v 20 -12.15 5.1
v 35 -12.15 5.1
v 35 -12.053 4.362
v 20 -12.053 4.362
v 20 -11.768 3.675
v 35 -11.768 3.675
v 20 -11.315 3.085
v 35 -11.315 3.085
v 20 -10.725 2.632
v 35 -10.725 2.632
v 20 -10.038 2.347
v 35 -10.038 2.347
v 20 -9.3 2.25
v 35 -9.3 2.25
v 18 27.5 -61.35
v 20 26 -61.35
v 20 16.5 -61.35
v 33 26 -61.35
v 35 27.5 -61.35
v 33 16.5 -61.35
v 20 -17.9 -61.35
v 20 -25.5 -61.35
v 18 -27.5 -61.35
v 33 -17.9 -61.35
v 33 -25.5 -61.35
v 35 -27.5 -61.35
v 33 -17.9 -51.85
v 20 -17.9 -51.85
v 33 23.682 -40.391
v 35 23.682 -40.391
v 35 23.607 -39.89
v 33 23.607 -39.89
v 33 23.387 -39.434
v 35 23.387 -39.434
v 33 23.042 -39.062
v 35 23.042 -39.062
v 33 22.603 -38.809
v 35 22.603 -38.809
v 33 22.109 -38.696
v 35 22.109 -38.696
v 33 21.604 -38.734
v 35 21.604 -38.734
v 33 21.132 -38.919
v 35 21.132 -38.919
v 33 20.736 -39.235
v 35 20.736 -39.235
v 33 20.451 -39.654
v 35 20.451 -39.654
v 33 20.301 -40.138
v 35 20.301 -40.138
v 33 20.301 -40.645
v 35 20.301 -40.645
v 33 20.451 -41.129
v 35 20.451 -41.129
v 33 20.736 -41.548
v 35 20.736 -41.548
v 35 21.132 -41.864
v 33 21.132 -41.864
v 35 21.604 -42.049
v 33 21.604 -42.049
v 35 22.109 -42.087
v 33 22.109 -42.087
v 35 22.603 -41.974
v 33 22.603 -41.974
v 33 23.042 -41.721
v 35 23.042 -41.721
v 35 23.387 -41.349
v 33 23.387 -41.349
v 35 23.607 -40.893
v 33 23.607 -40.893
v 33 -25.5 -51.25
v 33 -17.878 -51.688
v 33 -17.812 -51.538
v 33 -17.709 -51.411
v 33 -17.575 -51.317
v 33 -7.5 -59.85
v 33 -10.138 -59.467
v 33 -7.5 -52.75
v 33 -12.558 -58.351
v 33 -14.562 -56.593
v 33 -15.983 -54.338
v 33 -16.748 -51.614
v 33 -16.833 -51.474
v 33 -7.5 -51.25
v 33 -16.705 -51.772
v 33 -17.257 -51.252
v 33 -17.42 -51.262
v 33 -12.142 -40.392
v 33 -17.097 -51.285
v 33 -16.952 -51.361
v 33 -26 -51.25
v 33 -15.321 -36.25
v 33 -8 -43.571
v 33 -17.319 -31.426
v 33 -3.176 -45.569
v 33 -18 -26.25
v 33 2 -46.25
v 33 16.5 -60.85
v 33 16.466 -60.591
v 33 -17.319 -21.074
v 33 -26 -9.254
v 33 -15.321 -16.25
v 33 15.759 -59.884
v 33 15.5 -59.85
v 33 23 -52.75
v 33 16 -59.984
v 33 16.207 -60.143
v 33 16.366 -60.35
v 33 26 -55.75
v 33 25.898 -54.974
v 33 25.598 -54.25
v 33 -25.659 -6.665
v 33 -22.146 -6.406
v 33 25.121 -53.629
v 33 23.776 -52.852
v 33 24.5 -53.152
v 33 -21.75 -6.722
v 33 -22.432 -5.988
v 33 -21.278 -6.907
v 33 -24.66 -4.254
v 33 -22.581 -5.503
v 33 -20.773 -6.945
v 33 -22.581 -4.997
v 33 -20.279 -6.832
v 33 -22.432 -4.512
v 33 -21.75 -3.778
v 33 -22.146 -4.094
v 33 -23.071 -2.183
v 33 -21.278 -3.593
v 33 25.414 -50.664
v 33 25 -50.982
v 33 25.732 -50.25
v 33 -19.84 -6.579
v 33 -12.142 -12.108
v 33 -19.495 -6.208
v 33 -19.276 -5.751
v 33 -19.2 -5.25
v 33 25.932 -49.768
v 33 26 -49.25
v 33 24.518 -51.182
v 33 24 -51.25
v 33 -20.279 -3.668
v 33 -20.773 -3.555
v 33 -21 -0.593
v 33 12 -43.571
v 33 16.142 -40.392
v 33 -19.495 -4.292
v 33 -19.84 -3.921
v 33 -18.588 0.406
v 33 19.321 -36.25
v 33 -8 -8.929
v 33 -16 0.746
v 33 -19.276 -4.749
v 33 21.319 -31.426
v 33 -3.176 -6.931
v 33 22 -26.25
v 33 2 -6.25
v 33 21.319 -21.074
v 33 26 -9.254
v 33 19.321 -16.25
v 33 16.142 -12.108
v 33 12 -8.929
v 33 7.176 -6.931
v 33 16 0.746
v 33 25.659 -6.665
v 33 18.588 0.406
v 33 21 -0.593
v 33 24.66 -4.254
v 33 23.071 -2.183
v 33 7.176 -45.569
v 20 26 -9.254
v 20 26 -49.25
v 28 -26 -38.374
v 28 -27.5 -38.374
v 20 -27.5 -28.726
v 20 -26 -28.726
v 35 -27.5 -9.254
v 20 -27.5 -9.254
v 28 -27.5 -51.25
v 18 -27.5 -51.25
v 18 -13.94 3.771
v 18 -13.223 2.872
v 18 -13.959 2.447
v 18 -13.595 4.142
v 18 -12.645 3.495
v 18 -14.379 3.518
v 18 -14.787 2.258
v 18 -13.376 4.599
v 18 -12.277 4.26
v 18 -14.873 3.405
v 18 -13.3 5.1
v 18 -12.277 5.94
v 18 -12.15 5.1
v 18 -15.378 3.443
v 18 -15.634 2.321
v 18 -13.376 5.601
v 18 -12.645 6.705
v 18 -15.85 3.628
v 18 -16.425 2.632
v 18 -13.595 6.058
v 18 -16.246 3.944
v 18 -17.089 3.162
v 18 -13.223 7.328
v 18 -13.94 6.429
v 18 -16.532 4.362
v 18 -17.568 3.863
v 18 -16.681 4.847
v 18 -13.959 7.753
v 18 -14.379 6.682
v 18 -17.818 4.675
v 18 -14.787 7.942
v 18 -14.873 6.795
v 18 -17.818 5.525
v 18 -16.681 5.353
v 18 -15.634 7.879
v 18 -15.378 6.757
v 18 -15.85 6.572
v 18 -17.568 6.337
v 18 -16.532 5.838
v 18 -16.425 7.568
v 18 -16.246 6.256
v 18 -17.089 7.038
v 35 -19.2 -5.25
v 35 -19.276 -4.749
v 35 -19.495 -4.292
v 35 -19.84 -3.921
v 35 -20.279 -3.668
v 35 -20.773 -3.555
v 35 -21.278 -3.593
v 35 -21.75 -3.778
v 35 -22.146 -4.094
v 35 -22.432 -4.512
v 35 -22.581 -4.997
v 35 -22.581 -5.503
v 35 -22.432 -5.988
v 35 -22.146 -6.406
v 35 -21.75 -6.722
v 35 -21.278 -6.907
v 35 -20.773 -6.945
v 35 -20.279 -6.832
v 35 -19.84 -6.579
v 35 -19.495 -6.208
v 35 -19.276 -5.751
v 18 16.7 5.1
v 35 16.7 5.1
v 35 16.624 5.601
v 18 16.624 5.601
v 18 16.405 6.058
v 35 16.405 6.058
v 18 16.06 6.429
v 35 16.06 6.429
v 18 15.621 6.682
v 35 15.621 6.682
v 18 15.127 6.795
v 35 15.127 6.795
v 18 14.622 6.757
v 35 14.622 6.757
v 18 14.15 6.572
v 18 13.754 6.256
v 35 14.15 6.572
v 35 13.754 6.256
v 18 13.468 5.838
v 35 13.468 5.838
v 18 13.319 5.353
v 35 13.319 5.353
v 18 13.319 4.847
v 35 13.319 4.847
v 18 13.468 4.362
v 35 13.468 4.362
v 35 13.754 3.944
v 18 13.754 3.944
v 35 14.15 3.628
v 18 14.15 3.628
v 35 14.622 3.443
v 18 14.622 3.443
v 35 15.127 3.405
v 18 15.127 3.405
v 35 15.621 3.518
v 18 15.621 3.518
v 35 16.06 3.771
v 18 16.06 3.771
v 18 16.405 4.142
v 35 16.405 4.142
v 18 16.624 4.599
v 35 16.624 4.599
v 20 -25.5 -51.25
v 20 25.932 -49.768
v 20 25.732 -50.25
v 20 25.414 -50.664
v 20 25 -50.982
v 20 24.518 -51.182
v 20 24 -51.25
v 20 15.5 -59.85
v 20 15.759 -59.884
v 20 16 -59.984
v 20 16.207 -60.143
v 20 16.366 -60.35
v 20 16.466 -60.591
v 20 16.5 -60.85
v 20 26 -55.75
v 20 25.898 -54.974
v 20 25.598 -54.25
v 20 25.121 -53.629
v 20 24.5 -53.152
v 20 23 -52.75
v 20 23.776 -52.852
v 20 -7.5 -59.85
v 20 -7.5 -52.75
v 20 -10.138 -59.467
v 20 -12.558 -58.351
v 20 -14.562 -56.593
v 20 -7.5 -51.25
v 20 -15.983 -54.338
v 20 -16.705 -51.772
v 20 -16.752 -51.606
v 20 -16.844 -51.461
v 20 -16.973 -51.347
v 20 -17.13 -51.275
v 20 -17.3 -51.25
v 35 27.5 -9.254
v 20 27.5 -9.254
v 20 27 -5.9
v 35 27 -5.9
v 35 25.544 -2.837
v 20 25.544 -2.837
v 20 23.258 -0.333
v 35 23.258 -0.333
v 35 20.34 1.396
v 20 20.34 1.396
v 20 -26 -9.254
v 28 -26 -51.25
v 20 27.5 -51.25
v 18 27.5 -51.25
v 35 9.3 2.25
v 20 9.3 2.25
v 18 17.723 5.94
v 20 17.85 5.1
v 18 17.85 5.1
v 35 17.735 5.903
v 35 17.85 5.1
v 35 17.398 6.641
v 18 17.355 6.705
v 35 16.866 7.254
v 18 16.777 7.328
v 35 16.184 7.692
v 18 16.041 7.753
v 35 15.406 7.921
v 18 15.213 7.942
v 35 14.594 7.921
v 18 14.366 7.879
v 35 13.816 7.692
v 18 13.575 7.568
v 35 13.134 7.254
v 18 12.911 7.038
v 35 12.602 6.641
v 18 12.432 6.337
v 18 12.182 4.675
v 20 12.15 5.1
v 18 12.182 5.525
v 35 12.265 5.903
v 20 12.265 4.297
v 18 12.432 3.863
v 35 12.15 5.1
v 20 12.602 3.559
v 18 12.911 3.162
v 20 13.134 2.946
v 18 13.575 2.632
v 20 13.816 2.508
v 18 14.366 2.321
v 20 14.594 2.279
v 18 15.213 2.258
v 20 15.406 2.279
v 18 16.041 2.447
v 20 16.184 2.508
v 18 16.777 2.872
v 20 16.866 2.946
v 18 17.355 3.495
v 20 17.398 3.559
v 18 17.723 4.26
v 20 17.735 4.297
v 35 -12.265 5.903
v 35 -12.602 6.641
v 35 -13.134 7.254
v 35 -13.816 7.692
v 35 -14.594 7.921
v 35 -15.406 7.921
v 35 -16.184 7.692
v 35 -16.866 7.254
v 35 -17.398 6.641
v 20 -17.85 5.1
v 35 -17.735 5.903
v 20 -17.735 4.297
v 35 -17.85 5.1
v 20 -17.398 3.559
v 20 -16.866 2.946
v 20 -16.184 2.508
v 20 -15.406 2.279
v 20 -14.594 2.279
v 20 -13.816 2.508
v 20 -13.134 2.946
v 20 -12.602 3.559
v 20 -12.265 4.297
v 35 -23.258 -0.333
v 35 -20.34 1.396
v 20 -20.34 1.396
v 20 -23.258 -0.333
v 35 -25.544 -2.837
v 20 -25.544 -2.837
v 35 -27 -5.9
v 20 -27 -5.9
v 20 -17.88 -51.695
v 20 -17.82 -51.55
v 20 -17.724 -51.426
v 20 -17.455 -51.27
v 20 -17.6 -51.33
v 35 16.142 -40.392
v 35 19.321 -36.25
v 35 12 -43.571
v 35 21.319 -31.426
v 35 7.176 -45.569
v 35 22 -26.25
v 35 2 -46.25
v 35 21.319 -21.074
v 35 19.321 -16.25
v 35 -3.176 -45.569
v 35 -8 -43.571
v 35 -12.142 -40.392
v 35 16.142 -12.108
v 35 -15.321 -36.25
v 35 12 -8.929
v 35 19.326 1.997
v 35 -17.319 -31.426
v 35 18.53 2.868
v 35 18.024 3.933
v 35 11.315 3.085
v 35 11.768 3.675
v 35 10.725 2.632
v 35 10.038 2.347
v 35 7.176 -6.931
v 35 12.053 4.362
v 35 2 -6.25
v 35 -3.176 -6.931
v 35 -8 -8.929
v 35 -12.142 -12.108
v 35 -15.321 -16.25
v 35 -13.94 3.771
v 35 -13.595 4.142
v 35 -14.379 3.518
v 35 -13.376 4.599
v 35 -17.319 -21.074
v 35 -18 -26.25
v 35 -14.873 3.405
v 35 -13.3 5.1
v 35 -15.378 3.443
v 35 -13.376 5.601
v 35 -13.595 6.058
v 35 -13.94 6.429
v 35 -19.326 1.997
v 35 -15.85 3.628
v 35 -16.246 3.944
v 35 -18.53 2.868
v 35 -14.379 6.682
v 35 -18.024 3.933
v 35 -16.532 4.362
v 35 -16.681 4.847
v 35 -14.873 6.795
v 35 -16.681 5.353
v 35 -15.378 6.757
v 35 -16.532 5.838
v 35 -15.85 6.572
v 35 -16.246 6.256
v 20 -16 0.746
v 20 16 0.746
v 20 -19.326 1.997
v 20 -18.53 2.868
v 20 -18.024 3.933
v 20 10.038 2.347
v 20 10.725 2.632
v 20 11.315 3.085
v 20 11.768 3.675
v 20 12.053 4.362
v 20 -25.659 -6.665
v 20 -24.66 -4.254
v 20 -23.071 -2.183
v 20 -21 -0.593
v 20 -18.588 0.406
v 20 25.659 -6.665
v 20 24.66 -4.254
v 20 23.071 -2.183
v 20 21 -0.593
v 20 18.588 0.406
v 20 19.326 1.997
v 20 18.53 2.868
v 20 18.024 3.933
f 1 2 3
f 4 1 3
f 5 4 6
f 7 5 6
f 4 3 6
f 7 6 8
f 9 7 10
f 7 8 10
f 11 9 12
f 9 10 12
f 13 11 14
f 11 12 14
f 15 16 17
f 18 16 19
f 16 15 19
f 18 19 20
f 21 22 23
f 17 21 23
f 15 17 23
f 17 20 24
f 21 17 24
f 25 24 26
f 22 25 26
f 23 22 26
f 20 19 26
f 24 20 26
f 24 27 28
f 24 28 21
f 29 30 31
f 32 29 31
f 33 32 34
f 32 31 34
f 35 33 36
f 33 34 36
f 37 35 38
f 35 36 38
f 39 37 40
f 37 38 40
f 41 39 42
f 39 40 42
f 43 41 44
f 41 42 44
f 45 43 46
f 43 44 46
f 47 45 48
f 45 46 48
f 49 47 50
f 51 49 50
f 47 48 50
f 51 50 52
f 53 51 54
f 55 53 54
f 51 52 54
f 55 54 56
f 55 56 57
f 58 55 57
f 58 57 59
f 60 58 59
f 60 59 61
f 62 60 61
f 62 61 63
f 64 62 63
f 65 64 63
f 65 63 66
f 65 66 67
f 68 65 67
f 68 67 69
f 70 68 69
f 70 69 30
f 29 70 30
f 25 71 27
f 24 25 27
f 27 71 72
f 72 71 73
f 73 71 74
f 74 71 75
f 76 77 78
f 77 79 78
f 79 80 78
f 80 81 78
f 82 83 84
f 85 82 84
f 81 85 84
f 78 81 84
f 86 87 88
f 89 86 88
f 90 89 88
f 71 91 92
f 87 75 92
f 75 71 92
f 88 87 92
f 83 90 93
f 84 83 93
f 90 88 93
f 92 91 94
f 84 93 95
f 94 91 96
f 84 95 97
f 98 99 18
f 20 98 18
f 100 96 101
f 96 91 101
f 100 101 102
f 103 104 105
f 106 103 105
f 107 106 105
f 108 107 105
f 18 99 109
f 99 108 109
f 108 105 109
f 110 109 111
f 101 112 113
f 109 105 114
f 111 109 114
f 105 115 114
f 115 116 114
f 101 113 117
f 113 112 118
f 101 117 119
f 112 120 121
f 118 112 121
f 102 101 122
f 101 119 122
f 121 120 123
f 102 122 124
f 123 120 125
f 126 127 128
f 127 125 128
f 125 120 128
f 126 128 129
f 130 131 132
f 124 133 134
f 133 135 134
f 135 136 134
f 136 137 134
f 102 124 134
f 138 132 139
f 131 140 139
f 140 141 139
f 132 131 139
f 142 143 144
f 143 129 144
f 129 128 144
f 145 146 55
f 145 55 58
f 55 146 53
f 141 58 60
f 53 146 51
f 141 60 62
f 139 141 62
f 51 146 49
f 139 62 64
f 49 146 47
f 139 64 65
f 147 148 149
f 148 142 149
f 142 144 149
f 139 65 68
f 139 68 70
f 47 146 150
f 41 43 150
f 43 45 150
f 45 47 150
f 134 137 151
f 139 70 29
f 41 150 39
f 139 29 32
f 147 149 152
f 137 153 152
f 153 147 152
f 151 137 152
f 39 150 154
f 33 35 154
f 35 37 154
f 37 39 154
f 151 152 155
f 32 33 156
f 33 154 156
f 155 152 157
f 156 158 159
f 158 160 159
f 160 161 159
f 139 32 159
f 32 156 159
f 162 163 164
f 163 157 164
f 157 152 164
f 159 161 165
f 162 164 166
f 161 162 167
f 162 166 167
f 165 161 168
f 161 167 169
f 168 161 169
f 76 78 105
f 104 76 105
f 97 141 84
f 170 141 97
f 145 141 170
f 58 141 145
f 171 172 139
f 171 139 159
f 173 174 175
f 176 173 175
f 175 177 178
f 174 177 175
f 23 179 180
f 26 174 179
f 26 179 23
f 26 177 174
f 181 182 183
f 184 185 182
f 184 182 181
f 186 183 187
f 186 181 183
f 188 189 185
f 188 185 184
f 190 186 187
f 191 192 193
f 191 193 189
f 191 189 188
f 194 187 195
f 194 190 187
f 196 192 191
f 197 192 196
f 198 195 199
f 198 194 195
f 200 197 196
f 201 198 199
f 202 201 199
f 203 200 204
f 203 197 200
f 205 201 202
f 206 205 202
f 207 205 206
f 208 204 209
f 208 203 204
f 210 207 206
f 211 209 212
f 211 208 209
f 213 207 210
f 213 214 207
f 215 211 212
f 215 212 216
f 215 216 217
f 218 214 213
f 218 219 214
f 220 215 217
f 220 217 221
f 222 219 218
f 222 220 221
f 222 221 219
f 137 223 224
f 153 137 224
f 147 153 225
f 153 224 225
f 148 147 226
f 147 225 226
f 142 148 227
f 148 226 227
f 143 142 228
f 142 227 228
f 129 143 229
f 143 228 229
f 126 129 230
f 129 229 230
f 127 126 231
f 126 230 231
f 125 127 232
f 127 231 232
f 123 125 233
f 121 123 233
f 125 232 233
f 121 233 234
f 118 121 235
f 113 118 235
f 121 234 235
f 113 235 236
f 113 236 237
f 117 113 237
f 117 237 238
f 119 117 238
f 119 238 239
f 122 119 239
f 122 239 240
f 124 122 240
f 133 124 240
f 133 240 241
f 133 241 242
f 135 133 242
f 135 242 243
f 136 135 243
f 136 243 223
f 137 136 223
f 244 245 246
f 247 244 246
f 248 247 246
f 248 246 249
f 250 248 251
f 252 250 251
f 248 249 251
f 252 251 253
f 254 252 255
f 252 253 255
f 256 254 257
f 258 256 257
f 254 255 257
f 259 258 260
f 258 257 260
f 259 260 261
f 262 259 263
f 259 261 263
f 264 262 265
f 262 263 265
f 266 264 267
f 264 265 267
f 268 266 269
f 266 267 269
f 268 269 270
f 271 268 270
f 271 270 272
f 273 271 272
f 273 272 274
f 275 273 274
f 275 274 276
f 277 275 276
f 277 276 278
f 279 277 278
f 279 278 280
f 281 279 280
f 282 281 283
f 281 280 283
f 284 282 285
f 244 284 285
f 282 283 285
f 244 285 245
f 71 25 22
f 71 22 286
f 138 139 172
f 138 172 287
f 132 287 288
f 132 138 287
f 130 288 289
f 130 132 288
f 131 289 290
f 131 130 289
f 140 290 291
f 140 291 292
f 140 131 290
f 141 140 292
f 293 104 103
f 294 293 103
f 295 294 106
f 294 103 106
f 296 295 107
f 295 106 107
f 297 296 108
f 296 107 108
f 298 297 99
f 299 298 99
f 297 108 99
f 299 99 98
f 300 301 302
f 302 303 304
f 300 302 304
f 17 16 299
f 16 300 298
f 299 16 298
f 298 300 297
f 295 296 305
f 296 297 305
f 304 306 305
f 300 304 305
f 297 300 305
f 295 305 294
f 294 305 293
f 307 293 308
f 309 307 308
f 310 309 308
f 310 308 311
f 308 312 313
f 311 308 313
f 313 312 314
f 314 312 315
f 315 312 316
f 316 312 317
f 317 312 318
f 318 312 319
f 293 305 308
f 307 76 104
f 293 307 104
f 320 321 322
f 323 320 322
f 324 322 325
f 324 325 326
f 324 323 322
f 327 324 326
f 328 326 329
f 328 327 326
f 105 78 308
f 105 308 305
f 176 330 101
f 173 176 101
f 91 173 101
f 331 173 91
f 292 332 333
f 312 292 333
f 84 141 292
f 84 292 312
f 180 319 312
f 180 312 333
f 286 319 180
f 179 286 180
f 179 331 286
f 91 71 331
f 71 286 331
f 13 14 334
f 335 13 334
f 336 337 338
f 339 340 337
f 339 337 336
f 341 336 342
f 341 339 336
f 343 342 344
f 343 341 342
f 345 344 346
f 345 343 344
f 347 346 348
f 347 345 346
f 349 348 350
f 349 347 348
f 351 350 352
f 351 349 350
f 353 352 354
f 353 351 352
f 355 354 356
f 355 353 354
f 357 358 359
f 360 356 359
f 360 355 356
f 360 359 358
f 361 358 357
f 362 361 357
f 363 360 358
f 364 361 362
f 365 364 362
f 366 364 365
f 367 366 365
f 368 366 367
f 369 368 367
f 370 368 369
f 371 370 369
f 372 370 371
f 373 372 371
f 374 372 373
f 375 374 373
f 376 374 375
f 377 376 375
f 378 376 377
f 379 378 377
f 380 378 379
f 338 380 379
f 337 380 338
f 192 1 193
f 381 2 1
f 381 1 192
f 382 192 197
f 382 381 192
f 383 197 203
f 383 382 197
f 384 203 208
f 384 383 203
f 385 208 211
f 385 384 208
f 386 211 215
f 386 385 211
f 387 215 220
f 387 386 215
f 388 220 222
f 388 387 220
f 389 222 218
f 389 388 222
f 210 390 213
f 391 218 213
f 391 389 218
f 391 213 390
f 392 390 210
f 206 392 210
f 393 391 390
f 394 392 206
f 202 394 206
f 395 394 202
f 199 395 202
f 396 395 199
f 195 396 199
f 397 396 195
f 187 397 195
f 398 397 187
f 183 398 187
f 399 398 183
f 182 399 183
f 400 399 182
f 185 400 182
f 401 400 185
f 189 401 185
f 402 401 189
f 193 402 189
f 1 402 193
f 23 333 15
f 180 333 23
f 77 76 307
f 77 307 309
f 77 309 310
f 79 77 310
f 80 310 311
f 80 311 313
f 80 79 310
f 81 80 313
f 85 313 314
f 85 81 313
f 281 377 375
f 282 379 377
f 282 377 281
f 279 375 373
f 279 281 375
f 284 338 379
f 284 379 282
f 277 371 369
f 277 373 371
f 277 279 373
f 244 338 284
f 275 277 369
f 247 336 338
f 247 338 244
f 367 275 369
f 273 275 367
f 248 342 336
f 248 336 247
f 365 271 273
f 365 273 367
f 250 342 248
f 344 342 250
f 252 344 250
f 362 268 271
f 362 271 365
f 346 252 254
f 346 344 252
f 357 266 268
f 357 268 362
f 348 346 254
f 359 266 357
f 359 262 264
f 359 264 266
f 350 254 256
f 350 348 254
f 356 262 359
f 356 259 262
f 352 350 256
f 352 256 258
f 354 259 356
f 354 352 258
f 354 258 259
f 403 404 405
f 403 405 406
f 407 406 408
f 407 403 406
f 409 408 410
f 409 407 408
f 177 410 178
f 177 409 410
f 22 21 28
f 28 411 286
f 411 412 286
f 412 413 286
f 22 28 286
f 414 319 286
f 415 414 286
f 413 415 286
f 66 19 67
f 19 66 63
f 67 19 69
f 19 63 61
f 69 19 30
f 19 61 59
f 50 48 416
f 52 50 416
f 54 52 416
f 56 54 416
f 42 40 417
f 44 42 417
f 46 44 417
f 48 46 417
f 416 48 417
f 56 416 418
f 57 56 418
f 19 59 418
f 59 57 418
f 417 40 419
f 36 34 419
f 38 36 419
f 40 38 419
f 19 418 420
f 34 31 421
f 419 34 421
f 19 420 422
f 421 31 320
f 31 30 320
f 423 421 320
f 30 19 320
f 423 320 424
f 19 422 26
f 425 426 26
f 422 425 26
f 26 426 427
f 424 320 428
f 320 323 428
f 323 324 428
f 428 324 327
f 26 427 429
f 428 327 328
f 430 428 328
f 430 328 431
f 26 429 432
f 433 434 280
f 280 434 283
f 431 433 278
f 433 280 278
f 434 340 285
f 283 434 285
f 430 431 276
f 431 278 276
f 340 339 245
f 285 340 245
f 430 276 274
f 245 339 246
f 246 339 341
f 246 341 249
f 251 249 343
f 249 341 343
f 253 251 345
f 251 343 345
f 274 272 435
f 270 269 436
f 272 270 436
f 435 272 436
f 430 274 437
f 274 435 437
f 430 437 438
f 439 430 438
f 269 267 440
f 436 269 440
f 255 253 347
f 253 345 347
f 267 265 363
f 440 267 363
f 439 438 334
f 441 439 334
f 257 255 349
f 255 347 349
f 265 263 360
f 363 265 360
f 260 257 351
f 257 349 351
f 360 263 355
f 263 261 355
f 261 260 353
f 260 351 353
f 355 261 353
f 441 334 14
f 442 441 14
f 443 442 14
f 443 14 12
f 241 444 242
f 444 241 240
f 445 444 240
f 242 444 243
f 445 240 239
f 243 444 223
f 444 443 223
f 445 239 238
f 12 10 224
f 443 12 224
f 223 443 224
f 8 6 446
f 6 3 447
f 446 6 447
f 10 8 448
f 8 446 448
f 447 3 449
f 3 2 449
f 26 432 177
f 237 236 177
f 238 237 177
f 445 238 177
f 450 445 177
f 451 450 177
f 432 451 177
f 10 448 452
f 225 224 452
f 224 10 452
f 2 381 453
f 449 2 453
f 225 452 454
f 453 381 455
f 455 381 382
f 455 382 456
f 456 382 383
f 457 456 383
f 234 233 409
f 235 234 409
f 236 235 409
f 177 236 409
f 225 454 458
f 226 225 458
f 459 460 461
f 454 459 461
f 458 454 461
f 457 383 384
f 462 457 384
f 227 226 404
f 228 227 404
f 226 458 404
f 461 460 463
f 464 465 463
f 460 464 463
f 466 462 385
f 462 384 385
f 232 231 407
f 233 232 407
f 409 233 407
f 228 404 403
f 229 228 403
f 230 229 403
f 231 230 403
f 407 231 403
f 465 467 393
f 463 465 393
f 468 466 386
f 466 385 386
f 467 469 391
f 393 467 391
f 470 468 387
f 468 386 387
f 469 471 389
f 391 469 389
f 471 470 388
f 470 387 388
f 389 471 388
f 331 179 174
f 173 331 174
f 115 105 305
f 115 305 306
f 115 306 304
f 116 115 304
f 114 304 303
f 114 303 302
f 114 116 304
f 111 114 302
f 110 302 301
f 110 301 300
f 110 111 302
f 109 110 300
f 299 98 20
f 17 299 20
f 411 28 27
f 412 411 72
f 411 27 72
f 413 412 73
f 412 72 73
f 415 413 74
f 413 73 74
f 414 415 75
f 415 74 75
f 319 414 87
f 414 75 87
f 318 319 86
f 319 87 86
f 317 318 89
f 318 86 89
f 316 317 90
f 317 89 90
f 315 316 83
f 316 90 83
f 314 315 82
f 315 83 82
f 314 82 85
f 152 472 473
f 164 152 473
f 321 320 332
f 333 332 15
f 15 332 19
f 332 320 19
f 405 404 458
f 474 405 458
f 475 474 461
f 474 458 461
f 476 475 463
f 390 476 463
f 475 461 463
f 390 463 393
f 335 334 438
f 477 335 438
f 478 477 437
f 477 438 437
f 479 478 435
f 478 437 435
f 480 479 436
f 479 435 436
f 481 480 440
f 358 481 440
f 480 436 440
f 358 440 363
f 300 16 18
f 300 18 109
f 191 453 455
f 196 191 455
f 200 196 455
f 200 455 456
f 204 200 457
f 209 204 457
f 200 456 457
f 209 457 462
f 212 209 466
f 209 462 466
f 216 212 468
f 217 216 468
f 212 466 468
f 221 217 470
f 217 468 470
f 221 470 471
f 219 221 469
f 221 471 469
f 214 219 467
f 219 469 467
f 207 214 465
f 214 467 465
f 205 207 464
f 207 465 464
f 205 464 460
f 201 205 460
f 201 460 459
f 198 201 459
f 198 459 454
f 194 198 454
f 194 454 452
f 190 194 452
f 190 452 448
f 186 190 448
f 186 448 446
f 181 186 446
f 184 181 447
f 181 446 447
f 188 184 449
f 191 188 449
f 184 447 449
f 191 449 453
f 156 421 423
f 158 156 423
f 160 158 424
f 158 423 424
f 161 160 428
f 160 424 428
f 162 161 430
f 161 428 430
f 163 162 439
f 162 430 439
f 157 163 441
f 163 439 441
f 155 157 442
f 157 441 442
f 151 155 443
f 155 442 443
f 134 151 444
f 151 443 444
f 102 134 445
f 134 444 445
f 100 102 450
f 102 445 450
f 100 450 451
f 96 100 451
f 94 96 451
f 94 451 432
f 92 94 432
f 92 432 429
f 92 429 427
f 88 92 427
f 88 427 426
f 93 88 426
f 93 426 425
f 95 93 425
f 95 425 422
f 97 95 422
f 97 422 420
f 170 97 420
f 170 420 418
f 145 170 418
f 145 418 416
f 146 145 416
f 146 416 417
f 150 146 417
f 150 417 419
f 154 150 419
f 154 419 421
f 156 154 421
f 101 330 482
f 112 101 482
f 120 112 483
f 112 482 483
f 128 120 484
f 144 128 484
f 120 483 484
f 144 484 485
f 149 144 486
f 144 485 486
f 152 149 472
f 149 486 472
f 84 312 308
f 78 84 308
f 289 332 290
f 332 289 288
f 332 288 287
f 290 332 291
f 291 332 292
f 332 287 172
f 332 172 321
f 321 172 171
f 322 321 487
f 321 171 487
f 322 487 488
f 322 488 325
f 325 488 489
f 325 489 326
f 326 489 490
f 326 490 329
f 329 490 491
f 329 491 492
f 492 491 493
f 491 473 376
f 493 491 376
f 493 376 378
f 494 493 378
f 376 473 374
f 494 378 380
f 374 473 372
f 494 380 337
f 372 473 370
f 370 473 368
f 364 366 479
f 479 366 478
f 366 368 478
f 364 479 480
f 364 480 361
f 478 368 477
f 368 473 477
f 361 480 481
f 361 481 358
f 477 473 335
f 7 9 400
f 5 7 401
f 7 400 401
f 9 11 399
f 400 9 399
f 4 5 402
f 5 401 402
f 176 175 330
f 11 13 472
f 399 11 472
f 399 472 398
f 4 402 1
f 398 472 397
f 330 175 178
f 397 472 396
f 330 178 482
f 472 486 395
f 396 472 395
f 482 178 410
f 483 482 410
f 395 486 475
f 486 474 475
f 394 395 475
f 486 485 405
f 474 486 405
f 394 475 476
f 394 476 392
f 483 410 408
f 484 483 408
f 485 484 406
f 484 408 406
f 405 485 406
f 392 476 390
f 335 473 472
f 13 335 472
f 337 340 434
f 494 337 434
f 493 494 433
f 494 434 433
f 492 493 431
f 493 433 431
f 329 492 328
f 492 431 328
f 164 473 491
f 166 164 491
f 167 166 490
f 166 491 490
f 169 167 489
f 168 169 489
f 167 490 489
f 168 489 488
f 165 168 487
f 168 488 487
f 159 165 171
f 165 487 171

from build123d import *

# Parameters (mm, degrees)
PAD014_DEPTH    = 17
POCKET010_DEPTH = 15
SKETCH035_R     = 1.7
SKETCH035_R_2   = 20
POCKET011_DEPTH = 17
SKETCH036_W     = 0.5
SKETCH036_H     = 10.1
PAD015_DEPTH    = 13
SKETCH037_W     = 52
SKETCH037_H     = 10.1
PAD016_DEPTH    = 2
SKETCH038_W     = 53.5
SKETCH038_H     = 2
POCKET012_DEPTH = 55
POCKET013_DEPTH = 2
POCKET014_DEPTH = 1.5


with BuildPart() as part:
    # Sketch033 → Pad014 (new body)
    with BuildSketch(Plane.YZ):
        with BuildLine():
            Line((27.5, -61.35), (-27.5, -61.35))
            Line((-27.5, -51.25), (-27.5, -61.35))
            Line((-27.5, -9.2536580703), (-27.5, -51.25))
            ThreePointArc((-20.3403225806, 1.3958301754), (-25.5436814091, -2.837417336), (-27.5, -9.2536580703))
            ThreePointArc((-20.3403225806, 1.3958301754), (-18.5304586403, 2.8682640924), (-17.85, 5.1))
            ThreePointArc((-12.15, 5.1), (-15, 7.95), (-17.85, 5.1))
            ThreePointArc((-12.15, 5.1), (-11.3152543264, 3.0847456736), (-9.3, 2.25))
            Line((-9.3, 2.25), (9.3, 2.25))
            ThreePointArc((9.3, 2.25), (11.3152543264, 3.0847456736), (12.15, 5.1))
            ThreePointArc((17.85, 5.1), (15, 7.95), (12.15, 5.1))
            ThreePointArc((17.85, 5.1), (18.5304586403, 2.8682640924), (20.3403225806, 1.3958301754))
            ThreePointArc((27.5, -9.2536580703), (25.5436814091, -2.837417336), (20.3403225806, 1.3958301754))
            Line((27.5, -9.2536580703), (27.5, -51.25))
            Line((27.5, -51.25), (27.5, -61.35))
        make_face()
    extrude(amount=-PAD014_DEPTH)

    # Sketch034 (on Face16 of Pad014) → Pocket010 (cut)
    with BuildSketch(Plane(origin=(-17, 0, 0), x_dir=(0, -1, 0), z_dir=(-1, 0, 0))):
        with BuildLine():
            Line((26, -9.2536580703), (26, -61.35))
            Line((-26, -61.35), (26, -61.35))
            Line((-26, -61.35), (-26, -9.2536580703))
            ThreePointArc((-16, 0.7463419297), (-23.0710678119, -2.1825902585), (-26, -9.2536580703))
            Line((16, 0.7463419297), (-16, 0.7463419297))
            ThreePointArc((26, -9.2536580703), (23.0710678119, -2.1825902585), (16, 0.7463419297))
        make_face()
    extrude(amount=-POCKET010_DEPTH, mode=Mode.SUBTRACT)

    # Sketch035 (on Face4 of Pocket010) → Pocket011 (cut)
    with BuildSketch(Plane.YZ):
        with Locations((-15, 5.1)):
            Circle(SKETCH035_R)
        with Locations((15, 5.1)):
            Circle(SKETCH035_R)
        with Locations((-20.9, -5.25)):
            Circle(SKETCH035_R)
        with Locations((2, -26.25)):
            Circle(SKETCH035_R_2)
        with Locations((21.982166, -40.391422)):
            Circle(SKETCH035_R)
    extrude(amount=-POCKET011_DEPTH, mode=Mode.SUBTRACT)

    # Sketch036 (on Face27 of Pocket011) → Pad015 (join)
    with BuildSketch(Plane(origin=(-2, 0, 0), x_dir=(0, -1, 0), z_dir=(-1, 0, 0))):
        with BuildLine():
            ThreePointArc((17.9, -51.85), (17.3390474824, -51.2512719364), (16.7050823529, -51.7720705882))
            ThreePointArc((7.5, -59.85), (13.623448471, -57.5441622111), (16.7050823529, -51.7720705882))
            Line((7.5, -59.85), (-15.5, -59.85))
            ThreePointArc((-15.5, -59.85), (-16.2071067812, -60.1428932188), (-16.5, -60.85))
            Line((-16.5, -60.85), (-16.5, -61.35))
            Line((17.9, -61.35), (-16.5, -61.35))
            Line((17.9, -51.85), (17.9, -61.35))
        make_face()
        with Locations((25.75, -56.3)):
            Rectangle(SKETCH036_W, SKETCH036_H)
        with BuildLine():
            Line((-26, -49.25), (-26, -55.75))
            ThreePointArc((-23, -52.75), (-25.1213203436, -53.6286796564), (-26, -55.75))
            Line((7.5, -52.75), (-23, -52.75))
            Line((7.5, -51.25), (7.5, -52.75))
            Line((7.5, -51.25), (-24, -51.25))
            ThreePointArc((-26, -49.25), (-25.4142135624, -50.6642135624), (-24, -51.25))
        make_face()
    extrude(amount=PAD015_DEPTH)

    # Sketch037 (on Face31 of Pad015) → Pad016 (join)
    with BuildSketch(Plane(origin=(-15, 0, 0), x_dir=(0, -1, 0), z_dir=(-1, 0, 0))):
        with Locations((0, -56.3)):
            Rectangle(SKETCH037_W, SKETCH037_H)
    extrude(amount=PAD016_DEPTH)

    # Sketch038 (on Face11 of Pad016) → Pocket012 (cut)
    with BuildSketch(Plane(origin=(0, -27.5, 0), x_dir=(0, 0, 1), z_dir=(0, -1, 0))):
        with Locations((-24.5, 16)):
            Rectangle(SKETCH038_W, SKETCH038_H)
    extrude(amount=-POCKET012_DEPTH, mode=Mode.SUBTRACT)

    # Sketch039 (on Face33 of Pocket012) → Pocket013 (cut)
    with BuildSketch(Plane(origin=(-17, 0, 0), x_dir=(0, -1, 0), z_dir=(-1, 0, 0))):
        with BuildLine():
            ThreePointArc((-17.85, 5.1), (-15, 2.25), (-12.15, 5.1))
            Line((-9.3, 5.1), (-12.15, 5.1))
            Line((-9.3, 5.1), (-9.3, 0))
            Line((-9.3, 0), (-19.0433115599, 0))
            Line((-19.0433115599, 0), (-19.0433115599, 5.1))
            Line((-17.85, 5.1), (-19.0433115599, 5.1))
        make_face()
        with BuildLine():
            ThreePointArc((12.15, 5.1), (15, 2.25), (17.85, 5.1))
            Line((17.85, 5.1), (19.0433115599, 5.1))
            Line((19.0433115599, 5.1), (19.0433115599, 0))
            Line((19.0433115599, 0), (9.3, 0))
            Line((9.3, 0), (9.3, 5.1))
            Line((9.3, 5.1), (12.15, 5.1))
        make_face()
    extrude(amount=-POCKET013_DEPTH, mode=Mode.SUBTRACT)

    # Sketch040 (on Face11 of Pocket013) → Pocket014 (cut)
    with BuildSketch(Plane(origin=(0, -27.5, 0), x_dir=(0, 0, 1), z_dir=(0, -1, 0))):
        Polygon((-51.25, 15), (-51.25, 7), (-38.3735294118, 7), (-28.7264705882, 15), align=None)
    extrude(amount=-POCKET014_DEPTH, mode=Mode.SUBTRACT)


with BuildPart() as part_1:
    # Body006 placement: moved
    add(part.part.moved(Location((35, 0, 0))))


solid = part_1.part
